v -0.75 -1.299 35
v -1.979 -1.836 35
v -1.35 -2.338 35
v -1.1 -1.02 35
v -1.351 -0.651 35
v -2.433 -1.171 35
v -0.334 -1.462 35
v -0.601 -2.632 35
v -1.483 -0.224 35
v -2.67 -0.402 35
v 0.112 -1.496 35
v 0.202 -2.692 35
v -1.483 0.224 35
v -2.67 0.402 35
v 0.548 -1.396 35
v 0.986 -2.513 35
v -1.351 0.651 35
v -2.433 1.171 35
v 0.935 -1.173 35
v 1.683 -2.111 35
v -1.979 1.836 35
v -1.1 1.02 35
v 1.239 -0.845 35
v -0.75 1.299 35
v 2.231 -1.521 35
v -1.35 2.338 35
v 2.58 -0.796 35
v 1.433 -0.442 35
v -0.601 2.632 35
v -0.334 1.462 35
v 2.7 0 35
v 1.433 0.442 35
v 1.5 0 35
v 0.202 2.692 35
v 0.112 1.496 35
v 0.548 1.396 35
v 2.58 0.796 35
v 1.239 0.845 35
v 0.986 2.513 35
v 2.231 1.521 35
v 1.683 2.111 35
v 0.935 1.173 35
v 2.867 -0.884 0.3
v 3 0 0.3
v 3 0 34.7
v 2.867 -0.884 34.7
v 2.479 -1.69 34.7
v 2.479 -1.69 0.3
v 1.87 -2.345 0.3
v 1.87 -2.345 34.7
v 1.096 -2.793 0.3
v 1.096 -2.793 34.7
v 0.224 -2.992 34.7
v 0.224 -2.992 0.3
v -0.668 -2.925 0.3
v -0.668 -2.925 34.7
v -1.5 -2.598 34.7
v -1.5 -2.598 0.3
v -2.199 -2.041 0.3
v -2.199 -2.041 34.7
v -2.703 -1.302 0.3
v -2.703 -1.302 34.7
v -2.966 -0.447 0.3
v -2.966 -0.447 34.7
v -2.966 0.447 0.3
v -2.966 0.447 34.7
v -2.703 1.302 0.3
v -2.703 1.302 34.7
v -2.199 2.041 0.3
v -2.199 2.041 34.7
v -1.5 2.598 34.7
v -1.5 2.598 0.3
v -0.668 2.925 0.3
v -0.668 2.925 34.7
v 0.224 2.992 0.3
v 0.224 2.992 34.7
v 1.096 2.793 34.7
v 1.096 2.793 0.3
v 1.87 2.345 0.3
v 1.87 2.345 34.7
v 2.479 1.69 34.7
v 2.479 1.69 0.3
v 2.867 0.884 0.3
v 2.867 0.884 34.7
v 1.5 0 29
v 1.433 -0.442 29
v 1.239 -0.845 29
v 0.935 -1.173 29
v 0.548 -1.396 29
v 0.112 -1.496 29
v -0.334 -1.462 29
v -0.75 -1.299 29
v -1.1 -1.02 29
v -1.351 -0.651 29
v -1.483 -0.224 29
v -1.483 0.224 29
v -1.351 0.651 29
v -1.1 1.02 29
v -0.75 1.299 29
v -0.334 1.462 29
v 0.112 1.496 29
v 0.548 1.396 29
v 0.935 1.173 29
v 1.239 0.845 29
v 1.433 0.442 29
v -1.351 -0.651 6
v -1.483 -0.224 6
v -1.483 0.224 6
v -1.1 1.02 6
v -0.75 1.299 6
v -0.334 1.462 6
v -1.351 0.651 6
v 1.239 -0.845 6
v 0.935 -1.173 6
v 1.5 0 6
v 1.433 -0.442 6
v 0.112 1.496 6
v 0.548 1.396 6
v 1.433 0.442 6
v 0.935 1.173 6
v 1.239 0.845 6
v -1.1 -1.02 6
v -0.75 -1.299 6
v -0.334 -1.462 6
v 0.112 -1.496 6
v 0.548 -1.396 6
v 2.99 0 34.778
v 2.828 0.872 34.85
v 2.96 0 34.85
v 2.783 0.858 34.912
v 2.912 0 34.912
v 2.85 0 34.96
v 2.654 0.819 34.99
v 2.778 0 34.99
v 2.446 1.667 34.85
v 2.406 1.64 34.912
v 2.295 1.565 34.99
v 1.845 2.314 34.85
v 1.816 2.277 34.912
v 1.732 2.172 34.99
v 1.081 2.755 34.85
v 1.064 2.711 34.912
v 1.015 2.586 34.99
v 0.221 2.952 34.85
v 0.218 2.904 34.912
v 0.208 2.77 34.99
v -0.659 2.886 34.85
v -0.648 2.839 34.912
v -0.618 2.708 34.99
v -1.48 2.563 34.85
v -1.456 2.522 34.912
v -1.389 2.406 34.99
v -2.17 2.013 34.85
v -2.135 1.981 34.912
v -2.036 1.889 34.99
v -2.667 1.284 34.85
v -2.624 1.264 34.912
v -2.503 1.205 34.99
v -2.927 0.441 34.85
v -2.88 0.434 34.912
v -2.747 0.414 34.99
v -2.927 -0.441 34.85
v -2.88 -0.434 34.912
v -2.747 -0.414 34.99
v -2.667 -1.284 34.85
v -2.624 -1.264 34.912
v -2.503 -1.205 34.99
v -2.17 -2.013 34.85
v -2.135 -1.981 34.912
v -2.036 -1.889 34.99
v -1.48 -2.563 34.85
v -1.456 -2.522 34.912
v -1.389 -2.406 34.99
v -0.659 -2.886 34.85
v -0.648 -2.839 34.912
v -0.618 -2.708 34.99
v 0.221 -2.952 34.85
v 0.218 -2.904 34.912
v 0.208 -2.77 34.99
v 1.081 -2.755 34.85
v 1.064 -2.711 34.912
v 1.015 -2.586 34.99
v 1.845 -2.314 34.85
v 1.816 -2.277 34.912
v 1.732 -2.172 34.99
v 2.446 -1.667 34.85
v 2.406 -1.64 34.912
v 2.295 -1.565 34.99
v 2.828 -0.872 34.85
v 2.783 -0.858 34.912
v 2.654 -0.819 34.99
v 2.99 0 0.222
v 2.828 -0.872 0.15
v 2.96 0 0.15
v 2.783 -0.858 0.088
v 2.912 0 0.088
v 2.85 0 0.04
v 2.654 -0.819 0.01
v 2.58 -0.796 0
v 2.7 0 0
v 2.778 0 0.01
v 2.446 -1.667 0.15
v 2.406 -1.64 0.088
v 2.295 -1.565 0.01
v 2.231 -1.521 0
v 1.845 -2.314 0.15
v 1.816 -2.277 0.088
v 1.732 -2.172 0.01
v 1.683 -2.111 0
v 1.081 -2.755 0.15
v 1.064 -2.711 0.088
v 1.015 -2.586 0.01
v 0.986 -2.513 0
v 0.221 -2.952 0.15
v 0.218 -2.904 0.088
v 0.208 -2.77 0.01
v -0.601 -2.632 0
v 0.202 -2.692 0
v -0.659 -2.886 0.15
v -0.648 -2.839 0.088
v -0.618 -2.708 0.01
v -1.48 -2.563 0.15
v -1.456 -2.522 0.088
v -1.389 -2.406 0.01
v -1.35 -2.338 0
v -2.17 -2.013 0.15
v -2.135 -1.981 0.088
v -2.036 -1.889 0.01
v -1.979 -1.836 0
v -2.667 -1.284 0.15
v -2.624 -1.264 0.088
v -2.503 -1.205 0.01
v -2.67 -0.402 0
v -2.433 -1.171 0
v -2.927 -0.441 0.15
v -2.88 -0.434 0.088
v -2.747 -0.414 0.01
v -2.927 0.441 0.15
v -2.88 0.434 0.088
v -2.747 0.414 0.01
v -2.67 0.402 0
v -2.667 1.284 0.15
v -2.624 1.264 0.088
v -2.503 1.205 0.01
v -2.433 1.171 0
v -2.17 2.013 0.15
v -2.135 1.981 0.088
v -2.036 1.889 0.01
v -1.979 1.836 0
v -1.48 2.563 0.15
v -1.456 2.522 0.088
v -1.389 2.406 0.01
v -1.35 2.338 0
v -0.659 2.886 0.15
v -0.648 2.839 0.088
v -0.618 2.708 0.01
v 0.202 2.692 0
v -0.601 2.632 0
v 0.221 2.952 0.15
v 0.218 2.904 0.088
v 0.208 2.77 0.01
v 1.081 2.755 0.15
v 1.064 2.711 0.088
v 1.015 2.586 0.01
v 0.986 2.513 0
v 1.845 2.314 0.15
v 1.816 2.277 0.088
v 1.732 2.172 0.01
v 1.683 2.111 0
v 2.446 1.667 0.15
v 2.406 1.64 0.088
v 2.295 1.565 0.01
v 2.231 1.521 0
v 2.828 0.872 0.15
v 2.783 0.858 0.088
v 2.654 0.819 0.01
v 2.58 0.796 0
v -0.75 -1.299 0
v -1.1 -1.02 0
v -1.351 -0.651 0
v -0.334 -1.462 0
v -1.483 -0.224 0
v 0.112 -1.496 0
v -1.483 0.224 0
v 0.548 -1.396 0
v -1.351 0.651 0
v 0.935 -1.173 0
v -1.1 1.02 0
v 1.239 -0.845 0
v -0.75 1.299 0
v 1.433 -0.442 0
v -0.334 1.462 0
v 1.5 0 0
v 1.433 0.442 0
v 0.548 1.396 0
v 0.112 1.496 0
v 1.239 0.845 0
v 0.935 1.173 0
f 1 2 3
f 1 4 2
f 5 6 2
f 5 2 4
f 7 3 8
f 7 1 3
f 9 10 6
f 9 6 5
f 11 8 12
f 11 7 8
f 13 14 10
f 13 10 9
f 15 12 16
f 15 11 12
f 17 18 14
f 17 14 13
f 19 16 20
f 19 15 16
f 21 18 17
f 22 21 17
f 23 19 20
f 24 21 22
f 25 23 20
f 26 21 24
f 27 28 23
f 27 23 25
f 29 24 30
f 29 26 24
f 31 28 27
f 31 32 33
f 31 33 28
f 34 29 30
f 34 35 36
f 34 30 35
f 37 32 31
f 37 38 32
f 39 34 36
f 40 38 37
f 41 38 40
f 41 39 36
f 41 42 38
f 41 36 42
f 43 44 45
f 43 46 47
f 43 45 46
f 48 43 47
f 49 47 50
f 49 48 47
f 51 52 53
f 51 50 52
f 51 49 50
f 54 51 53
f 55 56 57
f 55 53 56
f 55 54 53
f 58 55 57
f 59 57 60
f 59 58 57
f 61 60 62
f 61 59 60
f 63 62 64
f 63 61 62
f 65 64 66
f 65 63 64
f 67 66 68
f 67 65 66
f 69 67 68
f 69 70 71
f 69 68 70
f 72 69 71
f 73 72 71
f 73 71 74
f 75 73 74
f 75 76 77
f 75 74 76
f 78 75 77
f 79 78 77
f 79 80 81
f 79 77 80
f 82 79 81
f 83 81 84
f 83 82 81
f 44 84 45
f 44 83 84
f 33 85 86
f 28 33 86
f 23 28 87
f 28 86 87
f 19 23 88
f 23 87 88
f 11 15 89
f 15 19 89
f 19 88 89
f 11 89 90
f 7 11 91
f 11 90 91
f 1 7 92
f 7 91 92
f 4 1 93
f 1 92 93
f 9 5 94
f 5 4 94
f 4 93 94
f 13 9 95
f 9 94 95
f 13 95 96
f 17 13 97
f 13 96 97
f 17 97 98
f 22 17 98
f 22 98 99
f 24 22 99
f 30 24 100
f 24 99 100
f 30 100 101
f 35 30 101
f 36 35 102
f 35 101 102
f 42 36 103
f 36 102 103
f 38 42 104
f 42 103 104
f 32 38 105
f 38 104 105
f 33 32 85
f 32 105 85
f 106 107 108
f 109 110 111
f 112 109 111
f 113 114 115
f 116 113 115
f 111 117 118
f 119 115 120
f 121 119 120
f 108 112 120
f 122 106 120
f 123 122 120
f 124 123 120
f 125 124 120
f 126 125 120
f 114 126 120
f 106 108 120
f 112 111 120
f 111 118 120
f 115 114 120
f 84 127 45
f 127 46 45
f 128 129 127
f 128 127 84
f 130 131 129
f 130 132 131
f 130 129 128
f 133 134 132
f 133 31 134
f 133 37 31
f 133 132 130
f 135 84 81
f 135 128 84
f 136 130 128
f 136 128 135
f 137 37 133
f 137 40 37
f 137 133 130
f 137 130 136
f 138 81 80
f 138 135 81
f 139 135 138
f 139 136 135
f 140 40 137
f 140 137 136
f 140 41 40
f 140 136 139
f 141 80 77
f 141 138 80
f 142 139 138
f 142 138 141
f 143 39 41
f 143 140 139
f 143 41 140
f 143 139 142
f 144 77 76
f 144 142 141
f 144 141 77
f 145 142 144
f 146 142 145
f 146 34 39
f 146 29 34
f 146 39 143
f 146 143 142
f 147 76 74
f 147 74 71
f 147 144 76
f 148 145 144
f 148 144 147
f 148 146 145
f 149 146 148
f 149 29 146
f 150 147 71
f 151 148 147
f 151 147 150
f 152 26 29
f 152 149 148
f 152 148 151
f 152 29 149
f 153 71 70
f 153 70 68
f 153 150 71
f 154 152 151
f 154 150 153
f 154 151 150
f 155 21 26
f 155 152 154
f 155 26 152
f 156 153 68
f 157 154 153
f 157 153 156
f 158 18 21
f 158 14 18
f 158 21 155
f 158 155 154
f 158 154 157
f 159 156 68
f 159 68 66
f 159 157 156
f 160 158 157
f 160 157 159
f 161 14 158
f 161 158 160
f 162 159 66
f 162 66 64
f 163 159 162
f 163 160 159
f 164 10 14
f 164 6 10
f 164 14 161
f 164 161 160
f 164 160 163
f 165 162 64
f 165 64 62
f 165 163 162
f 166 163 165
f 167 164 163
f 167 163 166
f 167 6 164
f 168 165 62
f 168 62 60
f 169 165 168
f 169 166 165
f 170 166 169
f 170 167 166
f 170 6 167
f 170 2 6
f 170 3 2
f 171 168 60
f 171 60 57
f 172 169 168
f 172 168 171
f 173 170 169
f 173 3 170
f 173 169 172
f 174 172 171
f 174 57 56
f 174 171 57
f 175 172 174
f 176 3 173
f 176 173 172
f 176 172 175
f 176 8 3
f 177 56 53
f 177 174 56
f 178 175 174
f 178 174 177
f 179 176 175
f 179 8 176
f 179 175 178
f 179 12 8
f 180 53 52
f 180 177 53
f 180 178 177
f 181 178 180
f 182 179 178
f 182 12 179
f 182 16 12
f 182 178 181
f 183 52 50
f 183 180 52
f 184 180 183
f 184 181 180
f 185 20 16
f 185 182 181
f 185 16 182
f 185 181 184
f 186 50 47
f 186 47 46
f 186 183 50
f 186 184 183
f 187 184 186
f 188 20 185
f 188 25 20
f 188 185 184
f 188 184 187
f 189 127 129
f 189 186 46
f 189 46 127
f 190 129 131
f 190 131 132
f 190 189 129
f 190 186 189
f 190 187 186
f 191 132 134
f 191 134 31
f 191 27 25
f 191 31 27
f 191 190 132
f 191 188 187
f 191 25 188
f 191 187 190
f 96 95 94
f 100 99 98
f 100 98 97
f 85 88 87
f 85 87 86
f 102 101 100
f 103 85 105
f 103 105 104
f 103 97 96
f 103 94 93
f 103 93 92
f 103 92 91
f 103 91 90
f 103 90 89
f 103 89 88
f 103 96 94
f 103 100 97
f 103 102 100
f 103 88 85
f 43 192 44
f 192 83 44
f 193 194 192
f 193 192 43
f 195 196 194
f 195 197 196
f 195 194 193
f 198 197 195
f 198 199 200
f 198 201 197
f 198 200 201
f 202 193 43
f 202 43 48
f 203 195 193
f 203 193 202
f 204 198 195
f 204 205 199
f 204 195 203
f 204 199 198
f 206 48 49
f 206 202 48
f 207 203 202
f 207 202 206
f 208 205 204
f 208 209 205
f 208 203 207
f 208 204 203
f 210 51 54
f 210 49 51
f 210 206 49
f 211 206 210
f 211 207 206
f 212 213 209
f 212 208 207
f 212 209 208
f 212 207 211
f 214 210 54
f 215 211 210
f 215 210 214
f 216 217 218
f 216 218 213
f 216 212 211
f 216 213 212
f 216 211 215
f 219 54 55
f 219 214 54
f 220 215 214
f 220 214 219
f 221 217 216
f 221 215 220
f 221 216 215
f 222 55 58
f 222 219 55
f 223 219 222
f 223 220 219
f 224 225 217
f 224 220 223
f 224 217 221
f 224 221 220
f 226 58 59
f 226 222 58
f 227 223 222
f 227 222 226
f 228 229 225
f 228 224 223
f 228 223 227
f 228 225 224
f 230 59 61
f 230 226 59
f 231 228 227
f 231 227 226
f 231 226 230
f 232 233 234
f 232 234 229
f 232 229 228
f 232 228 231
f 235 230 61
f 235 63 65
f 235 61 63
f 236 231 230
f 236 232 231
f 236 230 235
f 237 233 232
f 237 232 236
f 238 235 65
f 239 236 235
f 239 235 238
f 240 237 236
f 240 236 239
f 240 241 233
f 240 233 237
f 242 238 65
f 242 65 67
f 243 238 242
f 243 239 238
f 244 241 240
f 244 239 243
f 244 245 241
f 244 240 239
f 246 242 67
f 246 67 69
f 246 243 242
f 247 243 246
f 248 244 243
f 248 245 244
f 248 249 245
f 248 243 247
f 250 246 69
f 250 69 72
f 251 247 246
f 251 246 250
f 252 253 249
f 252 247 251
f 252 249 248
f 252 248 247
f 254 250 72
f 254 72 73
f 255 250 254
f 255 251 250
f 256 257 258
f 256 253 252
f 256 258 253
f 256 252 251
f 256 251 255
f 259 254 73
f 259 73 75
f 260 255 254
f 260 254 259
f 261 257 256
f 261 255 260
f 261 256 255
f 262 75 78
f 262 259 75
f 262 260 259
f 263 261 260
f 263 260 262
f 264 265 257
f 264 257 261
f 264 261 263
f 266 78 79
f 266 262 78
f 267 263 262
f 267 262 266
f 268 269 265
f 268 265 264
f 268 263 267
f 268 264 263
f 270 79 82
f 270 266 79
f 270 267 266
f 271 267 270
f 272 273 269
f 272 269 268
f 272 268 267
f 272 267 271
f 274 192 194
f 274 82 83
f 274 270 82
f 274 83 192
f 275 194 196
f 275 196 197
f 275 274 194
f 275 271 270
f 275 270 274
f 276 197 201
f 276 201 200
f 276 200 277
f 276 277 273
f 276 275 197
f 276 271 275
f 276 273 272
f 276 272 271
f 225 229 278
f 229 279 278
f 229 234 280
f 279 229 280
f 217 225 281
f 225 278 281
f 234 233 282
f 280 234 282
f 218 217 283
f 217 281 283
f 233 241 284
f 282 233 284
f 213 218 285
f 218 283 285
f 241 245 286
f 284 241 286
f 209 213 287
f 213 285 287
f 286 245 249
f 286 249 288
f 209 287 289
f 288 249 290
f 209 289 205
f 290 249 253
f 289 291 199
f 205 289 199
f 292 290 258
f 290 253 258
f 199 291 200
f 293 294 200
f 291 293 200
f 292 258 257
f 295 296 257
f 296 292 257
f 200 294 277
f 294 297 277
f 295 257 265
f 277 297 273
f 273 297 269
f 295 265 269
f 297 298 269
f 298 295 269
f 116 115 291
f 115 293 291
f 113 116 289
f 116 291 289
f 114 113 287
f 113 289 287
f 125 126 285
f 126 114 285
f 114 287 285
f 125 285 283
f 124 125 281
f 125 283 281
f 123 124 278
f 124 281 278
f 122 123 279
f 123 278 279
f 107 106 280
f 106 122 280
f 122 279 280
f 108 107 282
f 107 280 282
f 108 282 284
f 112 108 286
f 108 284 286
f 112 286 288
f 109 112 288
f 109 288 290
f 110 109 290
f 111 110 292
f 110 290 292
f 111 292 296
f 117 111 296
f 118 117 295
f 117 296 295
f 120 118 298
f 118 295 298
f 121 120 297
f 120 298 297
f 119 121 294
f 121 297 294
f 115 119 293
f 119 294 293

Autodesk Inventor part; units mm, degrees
ref_plane "YZ Plane" through (0, 0, 0) normal (1, 0, 0) x (0, 1, 0)
ref_plane "XZ Plane" through (0, 0, 0) normal (0, 1, 0) x (-1, 0, 0)
ref_plane "XY Plane" through (0, 0, 0) normal (0, 0, 1) x (1, 0, 0)
sketch "スケッチ1" plane through (0, 0, 0) normal (0, 0, 1) x (1, 0, 0)
  circle A0 centre (0, 0) radius 3
  circle A1 centre (0, 0) radius 1.5
  dimension "d0" = 6
  dimension "d1" = 3
extrude "押し出し1" add sketch "スケッチ1" along normal blind 35
fillet "フィレット1" radius 0.3 2 edges at (-3, 0, 35) (-3, 0, 0)
thread "ねじ1" size "M3x0.5" class "6H" standard "ANSI Metric M Profile" length 100
extrude "押し出し2" add sketch "スケッチ1" along normal blind 29 contours A1
extrude "押し出し3" cut sketch "スケッチ1" along normal blind 6 contours A1
thread "ねじ2" size "M3x0.5" class "6H" standard "ANSI Metric M Profile" full length
properties part number "スペーサーM3L35アルミ" material "アルミニウム 2014-T4"
